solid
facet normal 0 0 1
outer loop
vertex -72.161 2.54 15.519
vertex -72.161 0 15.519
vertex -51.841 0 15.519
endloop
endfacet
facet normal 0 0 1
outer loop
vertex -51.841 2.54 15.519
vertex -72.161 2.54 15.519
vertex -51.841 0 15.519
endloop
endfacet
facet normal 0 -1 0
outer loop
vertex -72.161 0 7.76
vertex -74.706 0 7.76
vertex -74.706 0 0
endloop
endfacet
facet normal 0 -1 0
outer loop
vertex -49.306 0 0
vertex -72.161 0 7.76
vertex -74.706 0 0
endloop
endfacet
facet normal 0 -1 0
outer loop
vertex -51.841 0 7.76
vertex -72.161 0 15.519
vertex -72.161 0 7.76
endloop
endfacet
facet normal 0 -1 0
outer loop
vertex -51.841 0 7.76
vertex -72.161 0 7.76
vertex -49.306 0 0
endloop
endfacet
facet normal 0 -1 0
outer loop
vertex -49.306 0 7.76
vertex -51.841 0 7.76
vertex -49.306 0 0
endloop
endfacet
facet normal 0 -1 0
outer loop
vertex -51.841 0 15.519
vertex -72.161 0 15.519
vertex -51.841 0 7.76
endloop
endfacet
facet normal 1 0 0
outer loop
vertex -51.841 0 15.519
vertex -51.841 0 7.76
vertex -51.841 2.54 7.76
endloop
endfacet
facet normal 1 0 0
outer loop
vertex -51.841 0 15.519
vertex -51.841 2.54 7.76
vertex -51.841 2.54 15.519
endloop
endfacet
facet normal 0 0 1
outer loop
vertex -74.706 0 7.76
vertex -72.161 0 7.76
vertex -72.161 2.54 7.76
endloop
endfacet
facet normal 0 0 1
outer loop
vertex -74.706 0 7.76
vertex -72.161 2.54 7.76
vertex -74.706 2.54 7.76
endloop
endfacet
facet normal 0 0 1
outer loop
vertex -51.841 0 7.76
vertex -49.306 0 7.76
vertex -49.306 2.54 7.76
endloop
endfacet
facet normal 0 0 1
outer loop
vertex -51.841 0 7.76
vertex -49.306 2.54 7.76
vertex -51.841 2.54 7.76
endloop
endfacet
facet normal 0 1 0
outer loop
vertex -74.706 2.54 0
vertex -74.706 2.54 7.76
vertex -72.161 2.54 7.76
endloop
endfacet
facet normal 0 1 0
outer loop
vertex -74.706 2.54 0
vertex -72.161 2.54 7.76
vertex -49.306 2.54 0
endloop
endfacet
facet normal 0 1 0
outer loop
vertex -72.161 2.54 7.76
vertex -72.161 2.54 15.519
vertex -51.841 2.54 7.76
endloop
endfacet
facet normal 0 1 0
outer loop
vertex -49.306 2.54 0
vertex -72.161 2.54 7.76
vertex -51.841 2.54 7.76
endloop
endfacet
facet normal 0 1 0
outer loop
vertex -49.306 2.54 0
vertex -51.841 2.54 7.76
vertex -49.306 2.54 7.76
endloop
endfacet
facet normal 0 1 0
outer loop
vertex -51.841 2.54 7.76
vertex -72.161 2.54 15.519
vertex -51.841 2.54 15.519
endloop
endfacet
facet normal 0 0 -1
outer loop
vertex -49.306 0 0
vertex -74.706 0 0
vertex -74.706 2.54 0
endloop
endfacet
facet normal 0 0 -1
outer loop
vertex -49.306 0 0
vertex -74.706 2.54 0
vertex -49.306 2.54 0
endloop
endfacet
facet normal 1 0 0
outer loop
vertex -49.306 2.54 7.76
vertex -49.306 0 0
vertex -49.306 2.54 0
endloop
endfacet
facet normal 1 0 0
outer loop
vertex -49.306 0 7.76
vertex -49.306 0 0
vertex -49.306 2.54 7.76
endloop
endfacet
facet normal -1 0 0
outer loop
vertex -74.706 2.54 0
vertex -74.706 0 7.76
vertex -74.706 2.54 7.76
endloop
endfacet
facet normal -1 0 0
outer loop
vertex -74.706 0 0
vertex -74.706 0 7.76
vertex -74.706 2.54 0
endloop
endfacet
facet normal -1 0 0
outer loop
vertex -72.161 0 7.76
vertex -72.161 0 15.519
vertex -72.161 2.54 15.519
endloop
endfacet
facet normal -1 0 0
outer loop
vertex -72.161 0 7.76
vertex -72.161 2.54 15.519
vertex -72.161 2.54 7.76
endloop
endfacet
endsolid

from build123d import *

# Parameters (mm, degrees)
F0_W     = 20.32
F0_H     = 2.571502
F0_H_2   = 2.610788
F1_DEPTH = 2.54


with BuildPart() as f1:
    # F0 (on Front) → F1 (new body)
    with BuildSketch(Plane.XZ):
        Polygon((-74.706252, 3.87985), (-74.706252, 0), (-62.006252, 0), (-49.306252, 0), (-49.306252, 3.87985), align=None)
        Polygon((-74.706252, 7.7597), (-74.706252, 3.87985), (-49.306252, 3.87985), (-49.306252, 7.7597), (-51.841478, 7.7597), (-62.006252, 7.7597), (-72.161478, 7.7597), align=None)
        Polygon((-72.161478, 10.33711), (-72.161478, 7.7597), (-62.006252, 7.7597), (-51.841478, 7.7597), (-51.841478, 10.33711), align=None)
        with Locations((-62.001478, 11.622861)):
            Rectangle(F0_W, F0_H)
        with Locations((-62.001478, 14.214006)):
            Rectangle(F0_W, F0_H_2)
    extrude(amount=-F1_DEPTH)


solid = f1.part
